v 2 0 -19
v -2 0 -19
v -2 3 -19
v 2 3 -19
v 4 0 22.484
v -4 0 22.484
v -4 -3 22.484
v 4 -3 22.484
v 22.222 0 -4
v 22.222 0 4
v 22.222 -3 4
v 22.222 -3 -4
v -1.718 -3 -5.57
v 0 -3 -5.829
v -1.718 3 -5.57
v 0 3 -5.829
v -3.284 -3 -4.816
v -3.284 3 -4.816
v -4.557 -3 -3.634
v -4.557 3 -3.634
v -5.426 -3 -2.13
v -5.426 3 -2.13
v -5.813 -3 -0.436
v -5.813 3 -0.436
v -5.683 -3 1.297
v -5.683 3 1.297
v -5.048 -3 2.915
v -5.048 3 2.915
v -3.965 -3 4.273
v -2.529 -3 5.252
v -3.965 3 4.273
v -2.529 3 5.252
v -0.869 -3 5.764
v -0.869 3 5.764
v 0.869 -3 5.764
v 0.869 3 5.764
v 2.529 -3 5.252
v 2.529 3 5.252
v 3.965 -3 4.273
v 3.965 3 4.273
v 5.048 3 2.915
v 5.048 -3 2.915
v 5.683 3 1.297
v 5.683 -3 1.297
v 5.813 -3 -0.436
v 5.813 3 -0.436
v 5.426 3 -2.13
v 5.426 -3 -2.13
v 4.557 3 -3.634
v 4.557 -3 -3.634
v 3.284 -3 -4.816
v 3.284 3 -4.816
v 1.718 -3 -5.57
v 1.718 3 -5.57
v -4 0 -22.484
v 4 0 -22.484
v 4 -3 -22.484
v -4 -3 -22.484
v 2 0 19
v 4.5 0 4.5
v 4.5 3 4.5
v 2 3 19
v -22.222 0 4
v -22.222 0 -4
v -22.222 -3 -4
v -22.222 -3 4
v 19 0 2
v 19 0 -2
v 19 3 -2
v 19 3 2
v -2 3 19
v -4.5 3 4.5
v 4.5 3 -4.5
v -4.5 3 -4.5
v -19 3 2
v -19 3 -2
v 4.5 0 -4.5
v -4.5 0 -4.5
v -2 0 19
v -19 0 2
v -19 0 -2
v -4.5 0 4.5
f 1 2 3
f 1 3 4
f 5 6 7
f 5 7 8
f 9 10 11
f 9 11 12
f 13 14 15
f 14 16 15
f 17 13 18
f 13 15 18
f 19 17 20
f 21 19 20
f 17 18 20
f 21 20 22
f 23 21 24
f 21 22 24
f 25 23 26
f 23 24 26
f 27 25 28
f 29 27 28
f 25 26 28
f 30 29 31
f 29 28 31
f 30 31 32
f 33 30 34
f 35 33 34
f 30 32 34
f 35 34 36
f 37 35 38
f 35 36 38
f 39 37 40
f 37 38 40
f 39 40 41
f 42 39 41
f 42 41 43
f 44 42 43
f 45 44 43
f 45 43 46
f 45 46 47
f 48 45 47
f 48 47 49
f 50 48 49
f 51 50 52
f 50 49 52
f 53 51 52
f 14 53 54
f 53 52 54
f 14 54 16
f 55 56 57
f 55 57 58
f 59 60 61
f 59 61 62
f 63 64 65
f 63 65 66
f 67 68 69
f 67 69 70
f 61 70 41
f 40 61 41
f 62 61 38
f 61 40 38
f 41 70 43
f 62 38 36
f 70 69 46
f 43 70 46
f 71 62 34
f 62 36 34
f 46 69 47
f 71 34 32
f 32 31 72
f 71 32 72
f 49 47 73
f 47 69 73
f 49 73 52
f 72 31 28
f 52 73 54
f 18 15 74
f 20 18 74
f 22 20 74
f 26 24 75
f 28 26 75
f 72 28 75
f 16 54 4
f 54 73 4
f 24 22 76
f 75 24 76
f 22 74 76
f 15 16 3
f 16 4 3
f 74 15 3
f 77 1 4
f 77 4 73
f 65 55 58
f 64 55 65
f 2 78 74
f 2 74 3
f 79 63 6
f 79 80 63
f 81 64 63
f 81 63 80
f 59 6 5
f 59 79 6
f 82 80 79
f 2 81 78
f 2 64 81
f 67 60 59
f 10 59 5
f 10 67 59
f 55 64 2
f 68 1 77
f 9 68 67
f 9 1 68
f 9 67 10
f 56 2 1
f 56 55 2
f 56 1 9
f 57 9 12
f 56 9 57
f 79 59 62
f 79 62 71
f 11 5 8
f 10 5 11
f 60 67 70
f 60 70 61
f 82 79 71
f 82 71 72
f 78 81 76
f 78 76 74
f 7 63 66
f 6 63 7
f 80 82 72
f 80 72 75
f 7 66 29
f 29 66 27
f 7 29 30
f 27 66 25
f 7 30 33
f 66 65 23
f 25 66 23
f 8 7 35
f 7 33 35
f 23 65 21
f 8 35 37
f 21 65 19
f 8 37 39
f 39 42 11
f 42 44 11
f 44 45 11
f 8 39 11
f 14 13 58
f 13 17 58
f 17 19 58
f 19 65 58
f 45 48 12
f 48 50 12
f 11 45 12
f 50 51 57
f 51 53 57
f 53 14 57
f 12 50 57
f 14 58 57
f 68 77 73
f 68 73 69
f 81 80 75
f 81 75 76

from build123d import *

# Parameters (mm, degrees)
BOSS_EXTRUDE1_DEPTH = 3
BOSS_EXTRUDE2_DEPTH = 3
SKETCH4_R           = 5.829154491
CUT_EXTRUDE3_DEPTH  = 10


with BuildPart() as part:
    # Sketch1 → Boss-Extrude1 (new body)
    with BuildSketch(Plane(origin=(0, 0, 0), x_dir=(1, 0, 0), z_dir=(0, 1, 0))):
        Polygon((-2, 19), (2, 19), (4.5, 4.5), (19, 2), (19, -2), (4.5, -4.5), (2, -19), (-2, -19), (-4.5, -4.5), (-19, -2), (-19, 2), (-4.5, 4.5), align=None)
    extrude(amount=BOSS_EXTRUDE1_DEPTH)

    # Sketch2 → Boss-Extrude2 (add)
    with BuildSketch(Plane(origin=(0, 0, 0), x_dir=(1, 0, 0), z_dir=(0, 1, 0))):
        Polygon((4, 22.483937469), (-4, 22.483937469), (-22.222005883, 4), (-22.222005883, -4), (-4, -22.483937469), (4, -22.483937469), (22.222005883, -4), (22.222005883, 4), align=None)
    extrude(amount=-BOSS_EXTRUDE2_DEPTH)

    # Sketch4 → Cut-Extrude3 (cut, symmetric)
    with BuildSketch(Plane(origin=(0, 0, 0), x_dir=(1, 0, 0), z_dir=(0, 1, 0))):
        with Locations(Location((0, 0, 0), (0, 0, 90))):
            Circle(SKETCH4_R)
    extrude(amount=CUT_EXTRUDE3_DEPTH, both=True, mode=Mode.SUBTRACT)


solid = part.part
